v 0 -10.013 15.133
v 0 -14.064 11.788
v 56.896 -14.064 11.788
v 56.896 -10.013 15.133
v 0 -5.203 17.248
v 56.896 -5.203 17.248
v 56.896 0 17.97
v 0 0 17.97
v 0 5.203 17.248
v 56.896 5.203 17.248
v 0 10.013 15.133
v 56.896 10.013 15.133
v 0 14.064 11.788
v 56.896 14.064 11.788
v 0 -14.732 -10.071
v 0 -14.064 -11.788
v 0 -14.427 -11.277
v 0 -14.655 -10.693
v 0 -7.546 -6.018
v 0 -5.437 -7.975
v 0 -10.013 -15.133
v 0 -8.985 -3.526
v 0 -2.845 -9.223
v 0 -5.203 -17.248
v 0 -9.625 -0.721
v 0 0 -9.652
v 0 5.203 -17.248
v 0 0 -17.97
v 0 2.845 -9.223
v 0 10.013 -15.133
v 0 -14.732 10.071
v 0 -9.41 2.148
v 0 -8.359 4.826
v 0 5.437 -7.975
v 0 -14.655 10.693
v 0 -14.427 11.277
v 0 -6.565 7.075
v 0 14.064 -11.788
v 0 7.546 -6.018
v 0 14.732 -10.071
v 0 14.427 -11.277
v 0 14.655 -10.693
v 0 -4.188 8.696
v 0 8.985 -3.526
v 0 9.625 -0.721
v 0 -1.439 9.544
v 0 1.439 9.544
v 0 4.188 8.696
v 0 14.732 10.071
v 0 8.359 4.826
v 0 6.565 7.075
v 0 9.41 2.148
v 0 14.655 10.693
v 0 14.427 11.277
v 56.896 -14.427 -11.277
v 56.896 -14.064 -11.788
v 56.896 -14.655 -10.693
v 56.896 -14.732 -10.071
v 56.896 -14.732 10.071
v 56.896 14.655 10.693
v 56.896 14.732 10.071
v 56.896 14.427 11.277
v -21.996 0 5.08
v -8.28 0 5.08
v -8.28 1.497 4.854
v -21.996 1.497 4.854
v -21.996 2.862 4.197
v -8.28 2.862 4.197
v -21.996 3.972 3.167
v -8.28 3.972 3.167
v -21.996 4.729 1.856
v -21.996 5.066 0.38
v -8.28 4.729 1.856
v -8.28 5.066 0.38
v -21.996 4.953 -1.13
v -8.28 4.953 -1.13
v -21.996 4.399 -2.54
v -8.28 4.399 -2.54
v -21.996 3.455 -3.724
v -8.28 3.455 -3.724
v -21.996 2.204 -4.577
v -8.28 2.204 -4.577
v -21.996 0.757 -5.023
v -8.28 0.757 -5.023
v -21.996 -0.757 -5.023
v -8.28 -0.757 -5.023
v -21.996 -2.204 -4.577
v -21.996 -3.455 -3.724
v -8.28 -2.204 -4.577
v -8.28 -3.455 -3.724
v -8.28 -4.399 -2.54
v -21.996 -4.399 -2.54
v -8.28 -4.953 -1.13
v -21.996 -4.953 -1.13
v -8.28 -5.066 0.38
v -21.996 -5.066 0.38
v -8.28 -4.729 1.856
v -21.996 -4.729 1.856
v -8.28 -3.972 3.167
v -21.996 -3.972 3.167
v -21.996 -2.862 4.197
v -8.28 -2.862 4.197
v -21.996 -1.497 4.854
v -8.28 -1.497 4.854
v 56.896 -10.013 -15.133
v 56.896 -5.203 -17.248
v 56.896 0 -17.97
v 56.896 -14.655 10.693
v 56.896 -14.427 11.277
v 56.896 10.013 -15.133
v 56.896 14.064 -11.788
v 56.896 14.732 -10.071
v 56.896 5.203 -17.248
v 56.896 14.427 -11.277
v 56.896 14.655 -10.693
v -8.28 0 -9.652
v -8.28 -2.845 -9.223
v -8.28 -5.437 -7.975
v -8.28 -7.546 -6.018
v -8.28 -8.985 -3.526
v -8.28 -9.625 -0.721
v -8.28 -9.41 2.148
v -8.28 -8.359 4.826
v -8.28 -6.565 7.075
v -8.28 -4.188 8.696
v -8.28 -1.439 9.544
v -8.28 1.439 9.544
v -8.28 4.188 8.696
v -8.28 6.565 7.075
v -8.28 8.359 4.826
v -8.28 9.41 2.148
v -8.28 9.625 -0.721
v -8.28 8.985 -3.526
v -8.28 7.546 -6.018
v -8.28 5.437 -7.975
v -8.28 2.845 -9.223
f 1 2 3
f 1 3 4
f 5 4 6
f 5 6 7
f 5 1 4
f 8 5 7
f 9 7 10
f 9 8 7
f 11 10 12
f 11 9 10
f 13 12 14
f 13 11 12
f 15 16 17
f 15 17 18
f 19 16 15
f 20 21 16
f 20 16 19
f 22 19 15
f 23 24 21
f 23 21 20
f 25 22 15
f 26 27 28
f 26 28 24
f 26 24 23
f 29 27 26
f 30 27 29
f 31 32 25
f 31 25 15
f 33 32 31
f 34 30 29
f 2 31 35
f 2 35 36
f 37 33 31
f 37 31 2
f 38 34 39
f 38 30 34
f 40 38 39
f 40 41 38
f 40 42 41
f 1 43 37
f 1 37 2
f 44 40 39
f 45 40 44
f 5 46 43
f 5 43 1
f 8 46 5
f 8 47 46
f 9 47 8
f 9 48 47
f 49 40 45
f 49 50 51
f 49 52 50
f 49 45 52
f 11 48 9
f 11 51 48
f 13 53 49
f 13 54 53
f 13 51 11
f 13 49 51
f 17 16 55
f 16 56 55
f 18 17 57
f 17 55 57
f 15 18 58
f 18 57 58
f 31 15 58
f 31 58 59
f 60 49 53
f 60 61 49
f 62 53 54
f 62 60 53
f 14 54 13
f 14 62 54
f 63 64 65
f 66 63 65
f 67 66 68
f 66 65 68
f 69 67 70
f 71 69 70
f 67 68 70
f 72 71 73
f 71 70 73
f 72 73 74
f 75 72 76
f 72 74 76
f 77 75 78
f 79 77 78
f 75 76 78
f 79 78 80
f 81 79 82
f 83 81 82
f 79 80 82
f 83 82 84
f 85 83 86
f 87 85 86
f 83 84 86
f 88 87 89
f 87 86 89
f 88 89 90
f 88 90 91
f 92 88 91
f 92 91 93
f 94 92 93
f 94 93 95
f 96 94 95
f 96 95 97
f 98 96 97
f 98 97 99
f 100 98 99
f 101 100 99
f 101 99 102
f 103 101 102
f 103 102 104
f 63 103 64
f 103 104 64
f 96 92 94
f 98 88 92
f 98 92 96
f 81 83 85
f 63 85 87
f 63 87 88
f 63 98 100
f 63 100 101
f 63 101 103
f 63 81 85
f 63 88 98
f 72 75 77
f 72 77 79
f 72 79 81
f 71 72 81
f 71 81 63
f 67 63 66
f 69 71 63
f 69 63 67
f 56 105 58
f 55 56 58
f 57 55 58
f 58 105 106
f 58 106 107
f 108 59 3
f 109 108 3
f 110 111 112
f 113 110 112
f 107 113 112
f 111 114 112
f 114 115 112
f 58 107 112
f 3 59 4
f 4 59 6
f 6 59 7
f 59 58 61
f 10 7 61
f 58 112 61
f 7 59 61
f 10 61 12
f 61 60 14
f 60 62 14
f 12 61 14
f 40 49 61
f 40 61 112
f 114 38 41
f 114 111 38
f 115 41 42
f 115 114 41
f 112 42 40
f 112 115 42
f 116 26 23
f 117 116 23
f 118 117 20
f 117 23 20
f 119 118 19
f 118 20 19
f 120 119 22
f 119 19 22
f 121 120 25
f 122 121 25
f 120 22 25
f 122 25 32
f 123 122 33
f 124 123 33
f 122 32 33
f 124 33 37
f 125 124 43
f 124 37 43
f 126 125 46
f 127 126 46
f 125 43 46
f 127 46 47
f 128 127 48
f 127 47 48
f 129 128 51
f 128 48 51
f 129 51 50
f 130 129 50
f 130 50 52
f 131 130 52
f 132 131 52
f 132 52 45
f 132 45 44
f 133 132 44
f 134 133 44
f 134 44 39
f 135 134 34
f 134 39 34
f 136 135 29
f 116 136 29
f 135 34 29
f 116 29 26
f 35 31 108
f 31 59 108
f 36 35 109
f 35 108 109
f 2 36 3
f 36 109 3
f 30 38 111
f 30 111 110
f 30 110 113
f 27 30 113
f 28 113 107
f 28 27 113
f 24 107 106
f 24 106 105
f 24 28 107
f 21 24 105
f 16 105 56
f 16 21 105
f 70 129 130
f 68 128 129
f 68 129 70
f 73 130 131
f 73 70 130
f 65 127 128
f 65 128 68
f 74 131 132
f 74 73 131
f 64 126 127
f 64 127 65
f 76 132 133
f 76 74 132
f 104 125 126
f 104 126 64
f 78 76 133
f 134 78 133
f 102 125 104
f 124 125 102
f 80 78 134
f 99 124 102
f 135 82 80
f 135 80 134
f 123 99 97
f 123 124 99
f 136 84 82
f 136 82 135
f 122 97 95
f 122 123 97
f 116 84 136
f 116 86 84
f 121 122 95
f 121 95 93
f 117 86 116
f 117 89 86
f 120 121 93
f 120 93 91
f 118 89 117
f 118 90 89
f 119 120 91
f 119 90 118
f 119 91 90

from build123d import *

# Parameters (mm, degrees)
BOSS_EXTRUDE1_DEPTH = 56.896
FILLET1_R           = 2.54
FILLET2_R           = 2.54
SKETCH2_R           = 9.652
BOSS_EXTRUDE2_DEPTH = 8.2804
SKETCH3_R           = 5.08
BOSS_EXTRUDE3_DEPTH = 13.716


with BuildPart() as part:
    # Sketch1 → Boss-Extrude1 (new body)
    with BuildSketch(Plane(origin=(0, 0, 0), x_dir=(0, 0, -1), z_dir=(1, 0, 0))):
        with BuildLine():
            Line((-11.019402446, 14.732), (11.019402446, 14.732))
            ThreePointArc((11.019402446, 14.732), (17.9705, 0), (11.019402446, -14.732))
            Line((11.019402446, -14.732), (-11.019402446, -14.732))
            ThreePointArc((-11.019402446, -14.732), (-17.9705, 0), (-11.019402446, 14.732))
        make_face()
    extrude(amount=BOSS_EXTRUDE1_DEPTH)

    # Fillet1
    fillet1_edges = [part.edges().sort_by_distance(p)[0] for p in [
        (28.448, -14.732, -11.019402446),
        (28.448, -14.732, 11.019402446),
    ]]
    fillet(fillet1_edges, radius=FILLET1_R)

    # Fillet2
    fillet2_edges = [part.edges().sort_by_distance(p)[0] for p in [
        (28.448, 14.732, 11.019402446),
        (28.448, 14.732, -11.019402446),
    ]]
    fillet(fillet2_edges, radius=FILLET2_R)

    # Sketch2 → Boss-Extrude2 (add)
    with BuildSketch(Plane.ZY):
        with Locations(Location((0, 0, 0), (0, 0, 180))):
            Circle(SKETCH2_R)
    extrude(amount=BOSS_EXTRUDE2_DEPTH)

    # Sketch3 → Boss-Extrude3 (add)
    with BuildSketch(Plane.ZY.offset(8.2804)):
        Circle(SKETCH3_R)
    extrude(amount=BOSS_EXTRUDE3_DEPTH)


solid = part.part
